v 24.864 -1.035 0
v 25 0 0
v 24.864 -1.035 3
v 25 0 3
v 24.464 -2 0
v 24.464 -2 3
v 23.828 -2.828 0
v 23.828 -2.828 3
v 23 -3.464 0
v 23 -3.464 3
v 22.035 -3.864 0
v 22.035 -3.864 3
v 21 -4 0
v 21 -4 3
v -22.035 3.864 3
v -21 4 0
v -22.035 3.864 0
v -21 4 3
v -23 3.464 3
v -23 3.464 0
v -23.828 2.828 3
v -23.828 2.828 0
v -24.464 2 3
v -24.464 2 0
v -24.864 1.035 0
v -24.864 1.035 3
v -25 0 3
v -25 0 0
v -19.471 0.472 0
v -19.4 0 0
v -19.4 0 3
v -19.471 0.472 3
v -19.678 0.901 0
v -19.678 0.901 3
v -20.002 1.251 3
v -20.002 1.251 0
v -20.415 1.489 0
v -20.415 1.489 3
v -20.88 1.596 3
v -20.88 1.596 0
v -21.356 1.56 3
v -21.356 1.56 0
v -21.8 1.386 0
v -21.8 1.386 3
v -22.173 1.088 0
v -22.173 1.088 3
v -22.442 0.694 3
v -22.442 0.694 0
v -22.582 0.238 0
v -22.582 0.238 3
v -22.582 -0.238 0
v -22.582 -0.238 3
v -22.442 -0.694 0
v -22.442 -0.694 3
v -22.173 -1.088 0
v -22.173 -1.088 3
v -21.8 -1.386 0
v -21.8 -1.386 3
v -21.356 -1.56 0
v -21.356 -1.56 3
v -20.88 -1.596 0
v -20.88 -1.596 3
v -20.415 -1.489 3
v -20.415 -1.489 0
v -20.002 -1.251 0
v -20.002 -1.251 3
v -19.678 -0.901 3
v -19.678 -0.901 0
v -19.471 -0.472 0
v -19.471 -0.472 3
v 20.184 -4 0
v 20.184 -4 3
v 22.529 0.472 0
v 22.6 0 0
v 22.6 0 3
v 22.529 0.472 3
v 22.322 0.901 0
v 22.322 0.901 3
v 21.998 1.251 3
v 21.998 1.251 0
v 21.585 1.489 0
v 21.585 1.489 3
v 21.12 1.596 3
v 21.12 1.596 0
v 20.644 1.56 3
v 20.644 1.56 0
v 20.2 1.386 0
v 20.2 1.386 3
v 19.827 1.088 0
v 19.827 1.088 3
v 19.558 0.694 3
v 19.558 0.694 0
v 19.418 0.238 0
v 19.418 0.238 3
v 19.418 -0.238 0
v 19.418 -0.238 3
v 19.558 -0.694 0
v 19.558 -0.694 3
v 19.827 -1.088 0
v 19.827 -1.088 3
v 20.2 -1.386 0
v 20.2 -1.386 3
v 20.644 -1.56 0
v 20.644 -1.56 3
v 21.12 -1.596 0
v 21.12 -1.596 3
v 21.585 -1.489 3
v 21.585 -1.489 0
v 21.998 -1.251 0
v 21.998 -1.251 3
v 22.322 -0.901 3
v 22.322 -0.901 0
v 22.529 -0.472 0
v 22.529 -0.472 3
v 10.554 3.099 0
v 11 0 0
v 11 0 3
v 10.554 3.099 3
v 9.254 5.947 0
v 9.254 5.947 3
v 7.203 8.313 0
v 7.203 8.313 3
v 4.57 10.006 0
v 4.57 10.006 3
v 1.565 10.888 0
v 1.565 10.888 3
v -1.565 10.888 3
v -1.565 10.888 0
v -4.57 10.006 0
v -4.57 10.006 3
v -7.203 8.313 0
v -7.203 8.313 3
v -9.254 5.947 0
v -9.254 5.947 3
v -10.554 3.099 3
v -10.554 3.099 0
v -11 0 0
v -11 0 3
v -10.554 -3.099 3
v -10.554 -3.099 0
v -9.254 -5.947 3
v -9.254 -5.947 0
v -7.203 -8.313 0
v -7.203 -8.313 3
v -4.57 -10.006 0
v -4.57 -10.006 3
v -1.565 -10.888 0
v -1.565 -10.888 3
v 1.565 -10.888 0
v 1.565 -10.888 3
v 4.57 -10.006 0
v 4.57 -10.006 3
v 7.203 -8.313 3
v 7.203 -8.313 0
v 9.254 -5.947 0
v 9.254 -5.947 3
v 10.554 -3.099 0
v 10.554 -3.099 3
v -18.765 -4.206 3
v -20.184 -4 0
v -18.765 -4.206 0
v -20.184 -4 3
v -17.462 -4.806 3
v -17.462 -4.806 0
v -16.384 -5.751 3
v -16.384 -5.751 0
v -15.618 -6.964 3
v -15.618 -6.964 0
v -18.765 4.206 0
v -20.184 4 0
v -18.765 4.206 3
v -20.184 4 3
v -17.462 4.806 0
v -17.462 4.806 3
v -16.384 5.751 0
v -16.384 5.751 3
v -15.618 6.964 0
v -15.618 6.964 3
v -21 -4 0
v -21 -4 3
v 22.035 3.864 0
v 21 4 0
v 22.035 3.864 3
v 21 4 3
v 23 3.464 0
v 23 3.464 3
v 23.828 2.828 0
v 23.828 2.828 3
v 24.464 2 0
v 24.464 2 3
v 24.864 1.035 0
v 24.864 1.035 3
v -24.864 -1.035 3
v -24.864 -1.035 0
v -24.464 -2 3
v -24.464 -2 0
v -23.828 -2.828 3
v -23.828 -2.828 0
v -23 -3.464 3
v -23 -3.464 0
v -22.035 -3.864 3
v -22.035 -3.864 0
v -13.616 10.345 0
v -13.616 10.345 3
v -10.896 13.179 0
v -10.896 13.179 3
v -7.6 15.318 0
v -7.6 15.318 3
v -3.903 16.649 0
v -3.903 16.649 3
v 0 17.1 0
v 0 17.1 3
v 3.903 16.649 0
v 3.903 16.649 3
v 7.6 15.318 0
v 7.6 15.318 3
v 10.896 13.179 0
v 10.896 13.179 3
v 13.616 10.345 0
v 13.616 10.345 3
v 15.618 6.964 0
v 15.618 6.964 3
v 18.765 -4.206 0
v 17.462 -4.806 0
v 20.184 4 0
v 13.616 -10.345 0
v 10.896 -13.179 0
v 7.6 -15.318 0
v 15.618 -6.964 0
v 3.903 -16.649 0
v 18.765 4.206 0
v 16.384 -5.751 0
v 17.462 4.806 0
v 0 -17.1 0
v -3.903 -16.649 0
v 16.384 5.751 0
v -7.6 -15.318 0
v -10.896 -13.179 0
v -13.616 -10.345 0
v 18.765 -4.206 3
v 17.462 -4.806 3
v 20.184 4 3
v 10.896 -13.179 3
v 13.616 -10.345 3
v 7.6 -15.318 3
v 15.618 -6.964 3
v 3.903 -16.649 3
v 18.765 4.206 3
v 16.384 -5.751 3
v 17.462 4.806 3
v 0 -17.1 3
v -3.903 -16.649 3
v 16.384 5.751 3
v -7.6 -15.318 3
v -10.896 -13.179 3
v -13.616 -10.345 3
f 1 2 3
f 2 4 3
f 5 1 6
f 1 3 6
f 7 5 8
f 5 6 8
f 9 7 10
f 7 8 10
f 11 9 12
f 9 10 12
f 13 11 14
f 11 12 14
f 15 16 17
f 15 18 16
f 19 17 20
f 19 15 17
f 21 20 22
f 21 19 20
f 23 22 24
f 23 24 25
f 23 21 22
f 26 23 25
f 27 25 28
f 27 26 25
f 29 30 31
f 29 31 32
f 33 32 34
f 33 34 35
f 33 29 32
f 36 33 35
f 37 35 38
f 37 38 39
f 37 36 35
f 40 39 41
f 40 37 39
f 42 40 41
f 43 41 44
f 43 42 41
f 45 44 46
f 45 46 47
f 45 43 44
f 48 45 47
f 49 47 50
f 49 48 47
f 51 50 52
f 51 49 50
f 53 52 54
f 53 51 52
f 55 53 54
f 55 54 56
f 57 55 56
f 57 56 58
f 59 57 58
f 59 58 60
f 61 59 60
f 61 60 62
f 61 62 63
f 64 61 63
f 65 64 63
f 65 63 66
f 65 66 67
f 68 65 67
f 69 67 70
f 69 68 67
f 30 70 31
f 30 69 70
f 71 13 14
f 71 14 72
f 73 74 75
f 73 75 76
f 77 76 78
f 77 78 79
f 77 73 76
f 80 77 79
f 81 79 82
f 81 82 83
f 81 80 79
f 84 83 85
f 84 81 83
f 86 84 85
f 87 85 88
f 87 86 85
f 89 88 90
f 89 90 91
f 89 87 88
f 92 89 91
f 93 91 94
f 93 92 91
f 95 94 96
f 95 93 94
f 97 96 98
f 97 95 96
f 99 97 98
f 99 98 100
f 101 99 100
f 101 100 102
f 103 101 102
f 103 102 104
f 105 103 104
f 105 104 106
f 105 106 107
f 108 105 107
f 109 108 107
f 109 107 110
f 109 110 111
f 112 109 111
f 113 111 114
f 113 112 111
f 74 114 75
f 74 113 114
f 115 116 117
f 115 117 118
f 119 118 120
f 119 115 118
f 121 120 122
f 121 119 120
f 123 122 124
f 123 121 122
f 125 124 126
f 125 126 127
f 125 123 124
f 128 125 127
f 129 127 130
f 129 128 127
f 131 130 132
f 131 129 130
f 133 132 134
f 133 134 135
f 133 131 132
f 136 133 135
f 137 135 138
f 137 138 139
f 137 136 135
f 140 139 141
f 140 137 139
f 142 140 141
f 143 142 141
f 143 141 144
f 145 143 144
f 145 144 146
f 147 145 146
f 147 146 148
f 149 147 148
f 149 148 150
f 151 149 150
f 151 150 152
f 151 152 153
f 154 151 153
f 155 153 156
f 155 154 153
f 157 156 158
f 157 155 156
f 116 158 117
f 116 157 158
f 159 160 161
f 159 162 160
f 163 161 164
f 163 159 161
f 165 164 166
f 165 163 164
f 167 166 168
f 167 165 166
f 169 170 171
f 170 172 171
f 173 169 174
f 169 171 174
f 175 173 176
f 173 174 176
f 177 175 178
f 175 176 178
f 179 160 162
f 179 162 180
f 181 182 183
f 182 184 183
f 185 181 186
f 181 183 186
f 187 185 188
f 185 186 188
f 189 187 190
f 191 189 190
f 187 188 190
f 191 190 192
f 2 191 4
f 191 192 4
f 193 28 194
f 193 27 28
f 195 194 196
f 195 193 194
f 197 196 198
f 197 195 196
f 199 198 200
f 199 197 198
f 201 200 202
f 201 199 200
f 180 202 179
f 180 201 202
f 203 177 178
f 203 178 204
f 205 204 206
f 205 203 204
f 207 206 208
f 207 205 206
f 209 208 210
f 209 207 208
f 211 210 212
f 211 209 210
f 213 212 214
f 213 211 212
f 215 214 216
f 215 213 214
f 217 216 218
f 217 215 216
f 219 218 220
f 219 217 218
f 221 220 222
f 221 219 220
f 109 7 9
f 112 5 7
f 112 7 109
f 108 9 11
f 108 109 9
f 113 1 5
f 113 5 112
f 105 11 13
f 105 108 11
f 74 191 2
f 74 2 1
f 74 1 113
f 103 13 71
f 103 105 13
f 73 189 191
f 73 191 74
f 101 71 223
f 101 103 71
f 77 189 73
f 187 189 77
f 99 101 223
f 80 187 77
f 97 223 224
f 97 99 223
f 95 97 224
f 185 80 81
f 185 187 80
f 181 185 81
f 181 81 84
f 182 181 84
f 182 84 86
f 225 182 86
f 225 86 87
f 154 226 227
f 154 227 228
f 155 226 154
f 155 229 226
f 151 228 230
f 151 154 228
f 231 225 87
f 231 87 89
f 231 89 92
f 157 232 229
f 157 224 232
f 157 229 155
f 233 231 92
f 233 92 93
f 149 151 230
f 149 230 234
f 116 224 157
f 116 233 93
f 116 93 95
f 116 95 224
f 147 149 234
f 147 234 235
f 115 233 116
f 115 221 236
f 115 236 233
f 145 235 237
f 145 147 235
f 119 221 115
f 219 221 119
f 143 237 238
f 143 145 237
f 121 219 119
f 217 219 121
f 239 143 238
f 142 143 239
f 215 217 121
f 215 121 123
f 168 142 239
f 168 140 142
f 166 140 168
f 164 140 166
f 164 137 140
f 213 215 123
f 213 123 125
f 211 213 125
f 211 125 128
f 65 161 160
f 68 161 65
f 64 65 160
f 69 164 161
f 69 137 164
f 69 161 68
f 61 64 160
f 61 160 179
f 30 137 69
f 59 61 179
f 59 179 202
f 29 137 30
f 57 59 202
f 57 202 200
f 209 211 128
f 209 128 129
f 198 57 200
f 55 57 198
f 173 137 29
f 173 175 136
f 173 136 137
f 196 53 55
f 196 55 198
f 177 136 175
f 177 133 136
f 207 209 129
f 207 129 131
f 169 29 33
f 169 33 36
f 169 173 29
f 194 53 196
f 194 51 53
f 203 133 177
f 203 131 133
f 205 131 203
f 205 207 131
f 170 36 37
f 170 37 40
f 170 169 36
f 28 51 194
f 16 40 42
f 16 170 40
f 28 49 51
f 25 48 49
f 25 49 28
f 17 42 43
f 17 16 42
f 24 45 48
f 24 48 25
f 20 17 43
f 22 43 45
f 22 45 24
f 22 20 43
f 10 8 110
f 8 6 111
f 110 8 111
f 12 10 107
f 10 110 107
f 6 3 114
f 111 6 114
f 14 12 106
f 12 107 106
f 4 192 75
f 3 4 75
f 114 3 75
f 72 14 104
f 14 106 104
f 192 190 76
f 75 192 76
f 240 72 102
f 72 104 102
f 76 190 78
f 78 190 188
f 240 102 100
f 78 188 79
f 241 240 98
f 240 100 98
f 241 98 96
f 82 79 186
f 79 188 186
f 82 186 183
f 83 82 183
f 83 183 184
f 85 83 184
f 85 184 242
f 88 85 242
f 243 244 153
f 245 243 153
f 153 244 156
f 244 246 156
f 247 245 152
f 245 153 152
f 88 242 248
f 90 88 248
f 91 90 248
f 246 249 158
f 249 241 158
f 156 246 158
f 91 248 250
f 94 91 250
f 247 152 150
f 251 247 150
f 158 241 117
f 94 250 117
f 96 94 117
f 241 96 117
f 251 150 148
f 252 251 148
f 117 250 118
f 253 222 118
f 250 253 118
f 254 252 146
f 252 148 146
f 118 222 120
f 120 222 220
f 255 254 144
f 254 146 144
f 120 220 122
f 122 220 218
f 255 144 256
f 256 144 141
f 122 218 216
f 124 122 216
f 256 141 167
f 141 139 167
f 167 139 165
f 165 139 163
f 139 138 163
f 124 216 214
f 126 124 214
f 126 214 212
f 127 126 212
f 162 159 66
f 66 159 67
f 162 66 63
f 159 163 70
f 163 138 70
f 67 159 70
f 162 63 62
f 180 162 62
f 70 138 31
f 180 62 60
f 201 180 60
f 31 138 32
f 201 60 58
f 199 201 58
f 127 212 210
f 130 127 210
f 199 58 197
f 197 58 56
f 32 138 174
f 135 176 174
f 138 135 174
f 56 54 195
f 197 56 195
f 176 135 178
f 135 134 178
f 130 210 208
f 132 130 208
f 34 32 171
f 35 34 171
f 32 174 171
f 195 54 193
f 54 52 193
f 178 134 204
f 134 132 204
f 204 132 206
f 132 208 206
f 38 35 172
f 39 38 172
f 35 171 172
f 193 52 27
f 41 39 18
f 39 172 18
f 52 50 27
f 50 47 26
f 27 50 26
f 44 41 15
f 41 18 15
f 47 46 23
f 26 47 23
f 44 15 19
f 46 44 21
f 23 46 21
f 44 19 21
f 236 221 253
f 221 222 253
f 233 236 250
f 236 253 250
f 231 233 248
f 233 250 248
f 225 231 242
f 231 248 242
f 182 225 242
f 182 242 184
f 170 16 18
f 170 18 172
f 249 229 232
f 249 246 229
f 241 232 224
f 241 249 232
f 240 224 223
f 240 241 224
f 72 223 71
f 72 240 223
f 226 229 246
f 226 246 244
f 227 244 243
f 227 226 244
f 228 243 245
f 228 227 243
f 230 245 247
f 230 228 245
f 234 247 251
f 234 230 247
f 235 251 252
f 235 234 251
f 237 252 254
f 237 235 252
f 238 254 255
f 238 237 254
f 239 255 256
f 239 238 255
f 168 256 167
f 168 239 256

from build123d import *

# Parameters (mm, degrees)
ESBO_O1_R                = 11
ESBO_O1_R_2              = 1.6
RESSALTO_EXTRUS_O1_DEPTH = 3
FILETE2_R                = 5
FILETE3_R                = 4


with BuildPart() as part:
    # Esboço1 → Ressalto-extrusão1 (new body)
    with BuildSketch(Plane.XY):
        with BuildLine():
            Line((-25, 4), (-16.625582697, 4))
            ThreePointArc((-16.625582697, 4), (0, 17.1), (16.625582697, 4))
            Line((16.625582697, 4), (25, 4))
            Line((25, 4), (25, -4))
            Line((25, -4), (16.625582697, -4))
            ThreePointArc((16.625582697, -4), (0, -17.1), (-16.625582697, -4))
            Line((-16.625582697, -4), (-25, -4))
            Line((-25, -4), (-25, 4))
        make_face()
        Circle(ESBO_O1_R, mode=Mode.SUBTRACT)
        with Locations((-21, 0)):
            Circle(ESBO_O1_R_2, mode=Mode.SUBTRACT)
        with Locations((21, 0)):
            Circle(ESBO_O1_R_2, mode=Mode.SUBTRACT)
    extrude(amount=RESSALTO_EXTRUS_O1_DEPTH)

    # Filete2
    filete2_edges = [part.edges().sort_by_distance(p)[0] for p in [
        (-16.625582697, 4, 1.5),
        (16.625582697, 4, 1.5),
        (16.625582697, -4, 1.5),
        (-16.625582697, -4, 1.5),
    ]]
    fillet(filete2_edges, radius=FILETE2_R)

    # Filete3
    filete3_edges = [part.edges().sort_by_distance(p)[0] for p in [
        (25, -4, 1.5),
        (25, 4, 1.5),
        (-25, -4, 1.5),
        (-25, 4, 1.5),
    ]]
    fillet(filete3_edges, radius=FILETE3_R - 0.0001)  # a hair under: the kernel refuses the full size


solid = part.part
